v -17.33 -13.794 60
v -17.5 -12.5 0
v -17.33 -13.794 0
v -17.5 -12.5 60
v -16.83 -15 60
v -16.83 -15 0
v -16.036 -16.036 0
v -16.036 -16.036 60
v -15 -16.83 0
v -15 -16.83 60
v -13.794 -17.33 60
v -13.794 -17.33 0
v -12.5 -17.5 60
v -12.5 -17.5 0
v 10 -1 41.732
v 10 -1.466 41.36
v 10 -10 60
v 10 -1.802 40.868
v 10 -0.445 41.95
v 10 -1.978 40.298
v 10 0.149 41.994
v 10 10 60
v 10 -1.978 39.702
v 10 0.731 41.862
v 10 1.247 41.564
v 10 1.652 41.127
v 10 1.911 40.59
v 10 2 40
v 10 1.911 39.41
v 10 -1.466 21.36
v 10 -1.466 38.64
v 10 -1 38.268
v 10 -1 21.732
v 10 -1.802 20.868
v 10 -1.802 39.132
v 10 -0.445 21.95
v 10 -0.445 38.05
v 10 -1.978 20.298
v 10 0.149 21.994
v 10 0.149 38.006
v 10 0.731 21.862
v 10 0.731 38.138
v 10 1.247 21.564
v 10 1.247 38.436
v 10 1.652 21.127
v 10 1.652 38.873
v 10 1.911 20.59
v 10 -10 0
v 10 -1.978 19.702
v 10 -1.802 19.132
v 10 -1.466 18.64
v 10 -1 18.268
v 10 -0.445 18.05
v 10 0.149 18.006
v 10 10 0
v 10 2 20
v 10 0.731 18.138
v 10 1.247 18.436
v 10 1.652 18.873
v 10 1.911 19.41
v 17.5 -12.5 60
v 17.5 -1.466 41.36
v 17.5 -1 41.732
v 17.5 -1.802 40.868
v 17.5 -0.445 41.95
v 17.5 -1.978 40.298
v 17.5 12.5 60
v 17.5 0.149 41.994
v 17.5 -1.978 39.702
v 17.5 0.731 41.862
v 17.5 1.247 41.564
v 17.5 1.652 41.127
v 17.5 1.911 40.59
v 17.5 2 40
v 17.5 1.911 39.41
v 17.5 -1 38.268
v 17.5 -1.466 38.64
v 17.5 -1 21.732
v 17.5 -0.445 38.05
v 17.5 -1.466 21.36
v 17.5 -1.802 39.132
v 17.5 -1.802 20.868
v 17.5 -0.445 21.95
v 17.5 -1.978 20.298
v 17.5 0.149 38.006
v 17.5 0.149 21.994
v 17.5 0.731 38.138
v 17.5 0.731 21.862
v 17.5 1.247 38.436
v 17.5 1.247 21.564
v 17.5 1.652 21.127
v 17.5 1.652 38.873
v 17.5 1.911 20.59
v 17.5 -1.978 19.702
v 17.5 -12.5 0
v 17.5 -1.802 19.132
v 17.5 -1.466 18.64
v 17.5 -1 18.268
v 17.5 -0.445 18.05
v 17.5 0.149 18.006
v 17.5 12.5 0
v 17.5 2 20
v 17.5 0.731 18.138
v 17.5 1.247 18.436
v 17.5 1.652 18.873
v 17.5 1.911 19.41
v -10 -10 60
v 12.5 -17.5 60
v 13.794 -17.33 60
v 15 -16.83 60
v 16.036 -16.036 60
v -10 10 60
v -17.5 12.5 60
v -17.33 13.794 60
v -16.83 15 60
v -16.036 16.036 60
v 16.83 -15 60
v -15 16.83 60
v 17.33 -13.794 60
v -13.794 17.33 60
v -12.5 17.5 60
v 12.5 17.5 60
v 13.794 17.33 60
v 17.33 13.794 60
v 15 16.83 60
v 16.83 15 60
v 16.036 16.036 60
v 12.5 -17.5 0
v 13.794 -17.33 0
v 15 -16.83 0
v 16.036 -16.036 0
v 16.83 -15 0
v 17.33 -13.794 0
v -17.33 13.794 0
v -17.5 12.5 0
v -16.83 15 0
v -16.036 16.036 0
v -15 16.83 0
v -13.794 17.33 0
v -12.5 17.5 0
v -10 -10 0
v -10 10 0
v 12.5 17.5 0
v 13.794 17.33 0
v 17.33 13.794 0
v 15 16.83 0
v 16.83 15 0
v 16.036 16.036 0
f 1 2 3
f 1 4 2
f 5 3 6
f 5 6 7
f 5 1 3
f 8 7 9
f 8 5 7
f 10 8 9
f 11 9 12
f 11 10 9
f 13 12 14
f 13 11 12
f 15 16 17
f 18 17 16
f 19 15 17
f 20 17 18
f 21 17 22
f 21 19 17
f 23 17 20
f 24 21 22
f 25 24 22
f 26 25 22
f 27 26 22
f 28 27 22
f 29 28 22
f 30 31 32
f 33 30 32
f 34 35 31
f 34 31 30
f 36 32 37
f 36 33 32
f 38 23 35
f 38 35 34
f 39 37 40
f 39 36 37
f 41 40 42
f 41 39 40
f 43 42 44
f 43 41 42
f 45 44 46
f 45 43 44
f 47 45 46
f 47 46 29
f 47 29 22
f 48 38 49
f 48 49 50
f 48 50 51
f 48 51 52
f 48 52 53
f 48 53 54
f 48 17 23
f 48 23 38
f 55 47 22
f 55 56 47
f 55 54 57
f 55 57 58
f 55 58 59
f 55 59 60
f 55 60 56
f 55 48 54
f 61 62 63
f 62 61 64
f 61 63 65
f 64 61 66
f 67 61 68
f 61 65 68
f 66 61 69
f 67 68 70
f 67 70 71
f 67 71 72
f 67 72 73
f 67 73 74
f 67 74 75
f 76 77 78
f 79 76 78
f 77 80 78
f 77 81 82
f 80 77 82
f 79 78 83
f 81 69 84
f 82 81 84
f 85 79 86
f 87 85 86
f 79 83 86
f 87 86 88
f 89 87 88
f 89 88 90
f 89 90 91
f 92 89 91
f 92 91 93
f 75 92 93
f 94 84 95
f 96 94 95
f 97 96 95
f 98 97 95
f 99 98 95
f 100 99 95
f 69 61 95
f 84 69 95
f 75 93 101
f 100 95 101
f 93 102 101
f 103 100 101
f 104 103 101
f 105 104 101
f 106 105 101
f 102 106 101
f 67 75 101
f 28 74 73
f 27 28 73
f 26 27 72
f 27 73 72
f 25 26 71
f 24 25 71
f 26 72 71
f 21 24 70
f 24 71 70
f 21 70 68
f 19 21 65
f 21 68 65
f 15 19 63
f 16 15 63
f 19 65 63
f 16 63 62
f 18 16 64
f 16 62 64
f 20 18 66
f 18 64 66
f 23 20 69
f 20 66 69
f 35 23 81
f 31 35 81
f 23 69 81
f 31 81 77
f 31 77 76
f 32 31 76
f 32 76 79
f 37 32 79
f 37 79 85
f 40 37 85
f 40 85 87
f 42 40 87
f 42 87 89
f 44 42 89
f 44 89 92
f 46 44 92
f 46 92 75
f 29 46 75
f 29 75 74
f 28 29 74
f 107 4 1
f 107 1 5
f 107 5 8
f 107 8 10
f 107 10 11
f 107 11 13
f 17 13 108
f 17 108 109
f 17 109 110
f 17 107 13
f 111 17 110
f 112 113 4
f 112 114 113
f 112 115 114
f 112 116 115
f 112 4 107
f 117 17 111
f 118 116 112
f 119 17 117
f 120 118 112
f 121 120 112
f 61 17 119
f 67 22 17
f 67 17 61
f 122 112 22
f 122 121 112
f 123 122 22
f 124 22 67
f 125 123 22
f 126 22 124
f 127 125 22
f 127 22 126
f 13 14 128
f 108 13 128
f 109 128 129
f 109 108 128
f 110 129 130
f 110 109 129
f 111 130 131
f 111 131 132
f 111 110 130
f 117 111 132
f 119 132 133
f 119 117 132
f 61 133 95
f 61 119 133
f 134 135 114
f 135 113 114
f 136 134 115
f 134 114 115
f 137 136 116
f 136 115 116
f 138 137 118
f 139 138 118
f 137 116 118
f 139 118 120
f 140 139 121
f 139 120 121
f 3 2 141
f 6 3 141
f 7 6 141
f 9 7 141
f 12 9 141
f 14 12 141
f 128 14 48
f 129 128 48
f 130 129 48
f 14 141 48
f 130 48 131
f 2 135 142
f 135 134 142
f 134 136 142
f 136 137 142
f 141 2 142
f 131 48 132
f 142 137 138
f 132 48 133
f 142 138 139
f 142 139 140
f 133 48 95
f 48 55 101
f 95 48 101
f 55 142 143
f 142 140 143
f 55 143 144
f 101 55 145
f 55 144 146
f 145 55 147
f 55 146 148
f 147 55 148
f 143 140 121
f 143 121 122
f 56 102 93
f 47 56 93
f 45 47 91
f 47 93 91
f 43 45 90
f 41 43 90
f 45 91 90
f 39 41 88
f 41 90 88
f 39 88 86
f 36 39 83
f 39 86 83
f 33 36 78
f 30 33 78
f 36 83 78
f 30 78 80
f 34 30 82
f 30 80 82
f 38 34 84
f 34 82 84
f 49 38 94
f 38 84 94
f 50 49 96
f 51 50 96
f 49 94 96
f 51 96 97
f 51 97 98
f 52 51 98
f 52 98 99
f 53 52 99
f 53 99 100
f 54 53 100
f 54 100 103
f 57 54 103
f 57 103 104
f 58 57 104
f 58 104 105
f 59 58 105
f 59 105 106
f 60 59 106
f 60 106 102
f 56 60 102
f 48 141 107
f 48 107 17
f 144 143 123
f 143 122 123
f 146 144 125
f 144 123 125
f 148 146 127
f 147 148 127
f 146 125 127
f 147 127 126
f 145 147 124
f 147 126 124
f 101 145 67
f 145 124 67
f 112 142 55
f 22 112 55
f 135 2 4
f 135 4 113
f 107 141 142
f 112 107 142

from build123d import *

# Parameters (mm, degrees)
F0_W     = 35
F0_H     = 35
F0_W_2   = 20
F0_H_2   = 20
F1_DEPTH = 60
F2_R     = 5
F3_R     = 2
F4_DEPTH = 10


with BuildPart() as f1:
    # F0 (on Top) → F1 (new body)
    with BuildSketch(Plane.XY):
        Rectangle(F0_W, F0_H)
        Rectangle(F0_W_2, F0_H_2, mode=Mode.SUBTRACT)
    extrude(amount=F1_DEPTH)

    # F2
    f2_edges = [f1.edges().sort_by_distance(p)[0] for p in [
        (17.5, 17.5, 30),
        (-17.5, 17.5, 30),
        (17.5, -17.5, 30),
        (-17.5, -17.5, 30),
    ]]
    fillet(f2_edges, radius=F2_R)

    # F3 (on face) → F4 (cut)
    with BuildSketch(Plane.YZ.offset(17.5)):
        with Locations((0, 40)):
            Circle(F3_R)
        with Locations((0, 20)):
            Circle(F3_R)
    extrude(amount=-F4_DEPTH, mode=Mode.SUBTRACT)


solid = f1.part
